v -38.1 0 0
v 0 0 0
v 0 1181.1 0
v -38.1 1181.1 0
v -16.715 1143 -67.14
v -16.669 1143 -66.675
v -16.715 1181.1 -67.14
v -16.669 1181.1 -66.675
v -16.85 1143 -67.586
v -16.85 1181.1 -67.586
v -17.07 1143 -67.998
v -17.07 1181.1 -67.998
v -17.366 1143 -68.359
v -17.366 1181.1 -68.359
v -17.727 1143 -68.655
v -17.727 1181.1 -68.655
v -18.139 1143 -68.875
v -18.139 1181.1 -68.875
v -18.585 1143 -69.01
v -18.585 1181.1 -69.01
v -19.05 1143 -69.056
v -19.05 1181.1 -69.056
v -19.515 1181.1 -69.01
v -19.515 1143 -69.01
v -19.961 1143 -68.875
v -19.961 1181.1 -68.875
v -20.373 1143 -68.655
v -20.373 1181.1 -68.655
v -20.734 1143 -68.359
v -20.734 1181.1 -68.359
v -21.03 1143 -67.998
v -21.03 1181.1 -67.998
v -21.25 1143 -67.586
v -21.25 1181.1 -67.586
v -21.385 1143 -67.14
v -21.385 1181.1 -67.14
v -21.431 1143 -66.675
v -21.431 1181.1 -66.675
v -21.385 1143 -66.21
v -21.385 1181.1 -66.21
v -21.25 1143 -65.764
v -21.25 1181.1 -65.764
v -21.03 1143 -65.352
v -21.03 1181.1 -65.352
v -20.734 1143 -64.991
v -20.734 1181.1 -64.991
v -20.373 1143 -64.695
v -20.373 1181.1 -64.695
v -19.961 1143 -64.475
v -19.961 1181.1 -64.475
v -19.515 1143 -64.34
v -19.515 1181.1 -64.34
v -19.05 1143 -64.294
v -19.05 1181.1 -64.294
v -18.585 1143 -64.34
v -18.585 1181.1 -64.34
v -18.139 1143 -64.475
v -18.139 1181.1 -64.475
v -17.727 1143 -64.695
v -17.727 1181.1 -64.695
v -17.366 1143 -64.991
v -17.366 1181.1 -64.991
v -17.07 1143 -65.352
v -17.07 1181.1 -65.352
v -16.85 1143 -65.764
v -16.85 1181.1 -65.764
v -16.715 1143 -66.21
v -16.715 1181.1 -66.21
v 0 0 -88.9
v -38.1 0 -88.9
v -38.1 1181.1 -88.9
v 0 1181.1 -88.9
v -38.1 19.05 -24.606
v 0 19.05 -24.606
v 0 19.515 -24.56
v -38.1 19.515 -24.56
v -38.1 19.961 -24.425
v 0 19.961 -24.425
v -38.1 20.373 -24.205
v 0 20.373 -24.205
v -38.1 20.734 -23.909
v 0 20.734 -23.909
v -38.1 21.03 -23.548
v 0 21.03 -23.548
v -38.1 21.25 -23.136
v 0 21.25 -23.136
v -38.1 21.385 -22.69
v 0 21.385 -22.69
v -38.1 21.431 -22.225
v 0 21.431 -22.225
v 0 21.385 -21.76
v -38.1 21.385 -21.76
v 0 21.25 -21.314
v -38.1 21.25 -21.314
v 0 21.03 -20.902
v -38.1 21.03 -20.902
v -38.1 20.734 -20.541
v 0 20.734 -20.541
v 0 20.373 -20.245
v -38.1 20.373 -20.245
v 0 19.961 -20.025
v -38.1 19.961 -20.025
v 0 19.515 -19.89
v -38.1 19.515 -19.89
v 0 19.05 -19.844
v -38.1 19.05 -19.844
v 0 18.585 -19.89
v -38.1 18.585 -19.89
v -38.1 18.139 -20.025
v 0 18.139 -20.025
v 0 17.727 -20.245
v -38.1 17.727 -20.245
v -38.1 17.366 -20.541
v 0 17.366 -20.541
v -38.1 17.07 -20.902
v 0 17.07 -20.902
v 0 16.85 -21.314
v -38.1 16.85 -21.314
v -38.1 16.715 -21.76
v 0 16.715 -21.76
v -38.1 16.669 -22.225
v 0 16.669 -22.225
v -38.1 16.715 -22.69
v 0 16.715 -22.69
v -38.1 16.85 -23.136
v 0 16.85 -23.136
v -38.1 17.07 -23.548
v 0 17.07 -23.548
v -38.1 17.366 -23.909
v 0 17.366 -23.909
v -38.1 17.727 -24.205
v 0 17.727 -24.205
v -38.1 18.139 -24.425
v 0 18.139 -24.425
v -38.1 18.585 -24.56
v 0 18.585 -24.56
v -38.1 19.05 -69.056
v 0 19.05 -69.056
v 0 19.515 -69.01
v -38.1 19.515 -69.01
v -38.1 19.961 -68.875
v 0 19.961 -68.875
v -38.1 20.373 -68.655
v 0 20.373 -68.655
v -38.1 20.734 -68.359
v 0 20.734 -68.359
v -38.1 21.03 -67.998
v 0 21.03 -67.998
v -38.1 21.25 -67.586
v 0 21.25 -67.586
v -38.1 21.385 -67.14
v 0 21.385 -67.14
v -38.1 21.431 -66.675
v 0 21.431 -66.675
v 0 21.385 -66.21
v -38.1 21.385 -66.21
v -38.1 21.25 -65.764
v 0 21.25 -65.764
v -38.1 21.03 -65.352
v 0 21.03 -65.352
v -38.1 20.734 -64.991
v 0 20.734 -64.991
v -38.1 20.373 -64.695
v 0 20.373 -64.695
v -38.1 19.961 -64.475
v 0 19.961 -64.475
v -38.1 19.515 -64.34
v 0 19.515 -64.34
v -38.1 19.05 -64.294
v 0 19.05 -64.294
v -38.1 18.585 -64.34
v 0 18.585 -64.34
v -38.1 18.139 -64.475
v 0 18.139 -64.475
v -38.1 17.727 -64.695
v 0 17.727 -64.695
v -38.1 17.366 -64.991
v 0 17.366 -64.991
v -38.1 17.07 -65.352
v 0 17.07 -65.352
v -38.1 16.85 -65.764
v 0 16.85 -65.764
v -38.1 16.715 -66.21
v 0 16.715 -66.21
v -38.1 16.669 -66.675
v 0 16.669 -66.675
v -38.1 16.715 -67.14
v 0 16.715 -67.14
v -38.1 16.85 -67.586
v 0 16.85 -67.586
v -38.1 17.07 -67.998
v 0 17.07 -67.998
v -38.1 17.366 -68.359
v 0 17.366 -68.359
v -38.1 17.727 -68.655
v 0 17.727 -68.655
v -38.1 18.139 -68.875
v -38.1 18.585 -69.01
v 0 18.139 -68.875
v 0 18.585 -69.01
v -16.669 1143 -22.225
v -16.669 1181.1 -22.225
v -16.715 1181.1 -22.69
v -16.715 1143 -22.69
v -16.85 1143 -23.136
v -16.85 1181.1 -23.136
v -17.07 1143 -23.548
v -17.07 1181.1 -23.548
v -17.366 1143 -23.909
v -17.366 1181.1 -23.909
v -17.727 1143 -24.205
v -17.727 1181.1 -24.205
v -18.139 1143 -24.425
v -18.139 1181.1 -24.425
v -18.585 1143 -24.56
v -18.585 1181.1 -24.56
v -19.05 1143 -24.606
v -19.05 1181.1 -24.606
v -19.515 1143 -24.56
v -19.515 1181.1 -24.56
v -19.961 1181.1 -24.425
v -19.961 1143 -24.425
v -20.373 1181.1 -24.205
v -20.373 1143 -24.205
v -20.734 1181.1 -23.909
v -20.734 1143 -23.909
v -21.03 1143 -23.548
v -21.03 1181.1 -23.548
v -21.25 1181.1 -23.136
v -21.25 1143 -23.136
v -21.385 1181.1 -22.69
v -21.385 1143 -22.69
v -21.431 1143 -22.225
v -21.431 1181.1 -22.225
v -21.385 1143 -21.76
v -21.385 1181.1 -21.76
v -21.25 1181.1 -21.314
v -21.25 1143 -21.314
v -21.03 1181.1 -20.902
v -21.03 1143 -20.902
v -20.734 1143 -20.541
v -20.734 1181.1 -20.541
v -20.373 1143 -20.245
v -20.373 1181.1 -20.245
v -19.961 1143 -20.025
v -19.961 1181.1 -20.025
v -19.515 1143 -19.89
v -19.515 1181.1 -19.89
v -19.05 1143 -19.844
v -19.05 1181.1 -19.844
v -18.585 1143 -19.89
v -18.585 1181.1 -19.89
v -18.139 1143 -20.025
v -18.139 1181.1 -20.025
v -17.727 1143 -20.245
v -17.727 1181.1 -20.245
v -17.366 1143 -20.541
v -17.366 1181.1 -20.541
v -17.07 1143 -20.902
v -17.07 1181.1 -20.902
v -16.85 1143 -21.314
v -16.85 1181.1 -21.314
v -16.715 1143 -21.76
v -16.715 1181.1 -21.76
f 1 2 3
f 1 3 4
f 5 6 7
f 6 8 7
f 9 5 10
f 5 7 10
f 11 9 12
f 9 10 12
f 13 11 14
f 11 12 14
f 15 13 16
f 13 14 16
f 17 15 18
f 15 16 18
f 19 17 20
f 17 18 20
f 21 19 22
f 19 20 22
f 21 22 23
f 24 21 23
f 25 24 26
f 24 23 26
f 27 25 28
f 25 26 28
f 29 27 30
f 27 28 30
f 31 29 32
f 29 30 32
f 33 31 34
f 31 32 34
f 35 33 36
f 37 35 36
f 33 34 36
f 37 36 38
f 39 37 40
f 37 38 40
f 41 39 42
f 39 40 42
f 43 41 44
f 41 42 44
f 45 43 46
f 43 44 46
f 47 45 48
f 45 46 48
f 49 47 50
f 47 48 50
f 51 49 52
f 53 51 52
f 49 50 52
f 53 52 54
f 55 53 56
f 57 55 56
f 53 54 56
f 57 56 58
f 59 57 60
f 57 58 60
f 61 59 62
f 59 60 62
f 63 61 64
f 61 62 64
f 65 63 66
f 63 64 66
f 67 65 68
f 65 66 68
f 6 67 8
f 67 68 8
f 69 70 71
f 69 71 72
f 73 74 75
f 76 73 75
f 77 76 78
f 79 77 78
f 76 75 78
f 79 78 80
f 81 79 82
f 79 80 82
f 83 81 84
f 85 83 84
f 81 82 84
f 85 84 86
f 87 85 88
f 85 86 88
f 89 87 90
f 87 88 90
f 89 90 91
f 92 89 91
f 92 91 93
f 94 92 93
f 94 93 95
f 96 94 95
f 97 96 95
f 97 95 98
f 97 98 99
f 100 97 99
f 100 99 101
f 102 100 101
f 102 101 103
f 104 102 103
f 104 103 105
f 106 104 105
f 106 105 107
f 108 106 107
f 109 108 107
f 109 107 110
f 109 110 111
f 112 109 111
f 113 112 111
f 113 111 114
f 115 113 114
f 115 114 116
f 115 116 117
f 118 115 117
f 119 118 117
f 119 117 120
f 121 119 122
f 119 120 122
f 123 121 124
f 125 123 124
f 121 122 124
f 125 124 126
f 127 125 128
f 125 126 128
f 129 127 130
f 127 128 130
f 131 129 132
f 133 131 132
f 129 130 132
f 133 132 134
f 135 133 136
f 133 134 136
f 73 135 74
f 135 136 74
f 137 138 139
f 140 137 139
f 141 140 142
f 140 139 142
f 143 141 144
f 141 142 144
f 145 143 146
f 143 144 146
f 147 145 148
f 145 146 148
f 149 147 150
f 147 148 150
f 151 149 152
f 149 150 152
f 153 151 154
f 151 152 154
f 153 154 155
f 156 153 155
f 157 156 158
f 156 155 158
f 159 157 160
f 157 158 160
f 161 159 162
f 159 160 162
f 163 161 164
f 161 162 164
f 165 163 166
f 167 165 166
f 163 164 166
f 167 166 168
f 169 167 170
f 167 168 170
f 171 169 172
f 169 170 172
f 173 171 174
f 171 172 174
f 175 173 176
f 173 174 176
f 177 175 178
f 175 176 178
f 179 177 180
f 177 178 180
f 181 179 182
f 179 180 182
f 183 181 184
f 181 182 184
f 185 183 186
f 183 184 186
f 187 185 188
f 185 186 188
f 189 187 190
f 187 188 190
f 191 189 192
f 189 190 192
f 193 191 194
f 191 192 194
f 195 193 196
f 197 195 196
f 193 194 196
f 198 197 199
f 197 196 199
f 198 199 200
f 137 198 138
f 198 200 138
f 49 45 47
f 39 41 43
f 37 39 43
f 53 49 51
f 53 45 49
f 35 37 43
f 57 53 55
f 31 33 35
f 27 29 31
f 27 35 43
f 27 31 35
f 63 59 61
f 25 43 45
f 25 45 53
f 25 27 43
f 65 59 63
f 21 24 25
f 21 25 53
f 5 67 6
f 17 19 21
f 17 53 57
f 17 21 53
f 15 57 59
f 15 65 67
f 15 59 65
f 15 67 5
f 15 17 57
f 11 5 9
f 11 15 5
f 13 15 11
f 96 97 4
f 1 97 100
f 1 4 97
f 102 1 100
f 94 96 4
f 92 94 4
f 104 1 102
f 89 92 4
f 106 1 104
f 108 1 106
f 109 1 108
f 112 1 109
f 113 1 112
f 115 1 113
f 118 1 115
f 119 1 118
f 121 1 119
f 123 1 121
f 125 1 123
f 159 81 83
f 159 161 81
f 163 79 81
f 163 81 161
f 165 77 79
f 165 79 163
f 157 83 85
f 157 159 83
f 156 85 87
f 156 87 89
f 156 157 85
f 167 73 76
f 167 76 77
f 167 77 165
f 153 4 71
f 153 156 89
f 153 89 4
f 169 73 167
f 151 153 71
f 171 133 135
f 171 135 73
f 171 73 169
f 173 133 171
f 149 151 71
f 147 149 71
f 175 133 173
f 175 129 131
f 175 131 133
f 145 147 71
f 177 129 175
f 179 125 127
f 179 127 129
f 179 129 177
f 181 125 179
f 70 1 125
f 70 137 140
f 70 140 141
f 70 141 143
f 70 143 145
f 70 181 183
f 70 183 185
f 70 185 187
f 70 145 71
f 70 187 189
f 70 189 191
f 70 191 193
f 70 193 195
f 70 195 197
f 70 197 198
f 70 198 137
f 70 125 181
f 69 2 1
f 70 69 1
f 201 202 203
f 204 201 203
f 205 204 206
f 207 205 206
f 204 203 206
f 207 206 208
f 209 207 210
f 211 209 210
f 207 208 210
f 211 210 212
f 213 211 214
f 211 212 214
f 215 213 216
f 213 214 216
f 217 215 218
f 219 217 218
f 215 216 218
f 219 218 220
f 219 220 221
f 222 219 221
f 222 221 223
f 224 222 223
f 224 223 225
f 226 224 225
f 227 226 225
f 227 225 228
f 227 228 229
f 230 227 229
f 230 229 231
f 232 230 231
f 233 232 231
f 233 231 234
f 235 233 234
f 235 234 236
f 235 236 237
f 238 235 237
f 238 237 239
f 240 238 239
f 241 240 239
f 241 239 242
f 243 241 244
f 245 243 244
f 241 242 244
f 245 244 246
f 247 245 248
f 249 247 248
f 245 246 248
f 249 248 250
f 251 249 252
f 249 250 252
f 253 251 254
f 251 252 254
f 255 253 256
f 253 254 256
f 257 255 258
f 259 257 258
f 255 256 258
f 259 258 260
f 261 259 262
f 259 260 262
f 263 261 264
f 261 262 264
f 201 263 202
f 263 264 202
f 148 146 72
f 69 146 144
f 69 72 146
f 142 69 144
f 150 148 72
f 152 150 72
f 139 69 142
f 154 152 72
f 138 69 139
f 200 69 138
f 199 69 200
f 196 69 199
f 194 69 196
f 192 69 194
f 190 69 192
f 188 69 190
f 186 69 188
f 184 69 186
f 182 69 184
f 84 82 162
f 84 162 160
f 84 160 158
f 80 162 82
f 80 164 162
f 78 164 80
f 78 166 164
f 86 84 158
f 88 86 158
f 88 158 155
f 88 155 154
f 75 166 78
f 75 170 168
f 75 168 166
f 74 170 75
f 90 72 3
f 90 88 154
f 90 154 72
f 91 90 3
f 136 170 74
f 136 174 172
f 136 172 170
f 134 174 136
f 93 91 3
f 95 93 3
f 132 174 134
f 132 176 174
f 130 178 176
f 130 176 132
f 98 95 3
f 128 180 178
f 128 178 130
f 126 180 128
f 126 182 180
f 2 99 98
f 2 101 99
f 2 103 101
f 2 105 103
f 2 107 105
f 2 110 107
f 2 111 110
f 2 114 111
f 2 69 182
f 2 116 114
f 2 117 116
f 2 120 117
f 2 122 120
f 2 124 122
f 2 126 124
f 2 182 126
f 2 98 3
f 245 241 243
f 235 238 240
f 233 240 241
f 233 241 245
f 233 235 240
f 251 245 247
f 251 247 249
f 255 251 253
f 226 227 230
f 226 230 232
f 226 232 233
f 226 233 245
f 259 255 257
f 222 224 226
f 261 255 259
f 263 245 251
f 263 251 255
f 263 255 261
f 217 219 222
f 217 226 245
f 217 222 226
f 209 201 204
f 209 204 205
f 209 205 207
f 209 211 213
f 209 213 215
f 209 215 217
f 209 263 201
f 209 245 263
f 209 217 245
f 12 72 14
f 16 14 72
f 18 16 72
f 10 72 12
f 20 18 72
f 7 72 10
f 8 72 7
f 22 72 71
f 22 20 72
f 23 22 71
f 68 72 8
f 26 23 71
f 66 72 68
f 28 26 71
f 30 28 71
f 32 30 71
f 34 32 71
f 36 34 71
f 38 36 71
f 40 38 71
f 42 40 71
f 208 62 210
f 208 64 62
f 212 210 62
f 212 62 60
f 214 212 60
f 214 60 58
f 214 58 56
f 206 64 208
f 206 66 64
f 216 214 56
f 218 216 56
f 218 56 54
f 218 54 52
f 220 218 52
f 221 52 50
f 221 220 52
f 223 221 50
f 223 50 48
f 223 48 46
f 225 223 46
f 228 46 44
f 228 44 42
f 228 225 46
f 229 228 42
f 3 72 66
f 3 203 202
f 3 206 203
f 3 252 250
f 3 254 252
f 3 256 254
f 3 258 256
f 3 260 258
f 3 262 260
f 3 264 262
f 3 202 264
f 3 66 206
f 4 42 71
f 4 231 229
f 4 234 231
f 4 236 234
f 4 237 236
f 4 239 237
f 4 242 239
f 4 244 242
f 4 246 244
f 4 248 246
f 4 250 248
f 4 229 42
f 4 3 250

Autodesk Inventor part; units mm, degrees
ref_plane "YZ Plane" through (0, 0, 0) normal (1, 0, 0) x (0, 1, 0)
ref_plane "XZ Plane" through (0, 0, 0) normal (0, 1, 0) x (-1, 0, 0)
ref_plane "XY Plane" through (0, 0, 0) normal (0, 0, 1) x (1, 0, 0)
sketch "Sketch1" plane through (0, 0, 0) normal (0, 1, 0) x (-1, 0, 0)
  line L0 (0, 0) -> (38.1, 0)
  line L1 (38.1, 0) -> (38.1, -88.9)
  line L2 (38.1, -88.9) -> (0, -88.9)
  line L3 (0, -88.9) -> (0, 0)
  dimension "d0" = 38.1
  dimension "d1" = 88.9
extrude "Wood" add sketch "Sketch1" along normal blind 1181.1
sketch "Sketch4" plane through (0, 1181.1, 0) normal (0, 1, 0) x (1, 0, 0)
  line L0 (-38.1, 0) -> (0, 0) projected
  line L1 (0, 88.9) -> (-38.1, 88.9) projected
  line L2 (0, 0) -> (-38.1, 0)
  line L3 (-38.1, 0) -> (-38.1, 88.9)
  line L4 (-38.1, 88.9) -> (0, 88.9)
  line L5 (0, 88.9) -> (0, 0)
  line L6 (-19.05, 88.9) -> (-38.1, 88.9)
  line L7 (-38.1, 88.9) -> (-38.1, 44.45)
  line L8 (-38.1, 44.45) -> (-19.05, 44.45)
  line L9 (-19.05, 44.45) -> (-19.05, 88.9)
  line L10 (-19.05, 66.675) -> (0, 66.675)
  line L11 (0, 66.675) -> (0, 44.45)
  line L12 (0, 44.45) -> (-19.05, 44.45)
  line L13 (-19.05, 44.45) -> (-19.05, 66.675)
  circle A0 centre (-19.05, 66.675) radius 2.3812
  circle A1 centre (-19.05, 22.225) radius 2.3812
  dimension "d11" = 4.7625
extrude "Extrusion4" cut sketch "Sketch4" against normal blind 38.1 contours A0 L9 | L9 L10 A0 | L10 L9 A0 | A1
sketch "Sketch5" plane through (0, 0, 0) normal (1, 0, 0) x (0, 0, -1)
  line L0 (88.9, 0) -> (0, 0) projected
  line L1 (88.9, 0) -> (88.9, 1181.1) projected
  line L2 (0, 0) -> (88.9, 0)
  line L3 (88.9, 0) -> (88.9, 38.1)
  line L4 (88.9, 38.1) -> (0, 38.1)
  line L5 (0, 38.1) -> (0, 0)
  line L6 (88.9, 0) -> (44.45, 0)
  line L7 (44.45, 0) -> (44.45, 38.1)
  line L8 (44.45, 38.1) -> (88.9, 38.1)
  line L9 (88.9, 38.1) -> (88.9, 0)
  line L10 (44.45, 38.1) -> (66.675, 38.1)
  line L11 (66.675, 38.1) -> (66.675, 19.05)
  line L12 (66.675, 19.05) -> (44.45, 19.05)
  line L13 (44.45, 19.05) -> (44.45, 38.1)
  circle A0 centre (66.675, 19.05) radius 2.3812
  circle A1 centre (22.225, 19.05) radius 2.3812
  dimension "d14" = 38.1
  dimension "d15" = 4.7625
extrude "Extrusion5" cut sketch "Sketch5" against normal up to surface (38.1 mm away) contours A0 L11 L12 | L12 L11 A0 | A1
properties part number "wallLeftShort" material "Wood (Birch)"
